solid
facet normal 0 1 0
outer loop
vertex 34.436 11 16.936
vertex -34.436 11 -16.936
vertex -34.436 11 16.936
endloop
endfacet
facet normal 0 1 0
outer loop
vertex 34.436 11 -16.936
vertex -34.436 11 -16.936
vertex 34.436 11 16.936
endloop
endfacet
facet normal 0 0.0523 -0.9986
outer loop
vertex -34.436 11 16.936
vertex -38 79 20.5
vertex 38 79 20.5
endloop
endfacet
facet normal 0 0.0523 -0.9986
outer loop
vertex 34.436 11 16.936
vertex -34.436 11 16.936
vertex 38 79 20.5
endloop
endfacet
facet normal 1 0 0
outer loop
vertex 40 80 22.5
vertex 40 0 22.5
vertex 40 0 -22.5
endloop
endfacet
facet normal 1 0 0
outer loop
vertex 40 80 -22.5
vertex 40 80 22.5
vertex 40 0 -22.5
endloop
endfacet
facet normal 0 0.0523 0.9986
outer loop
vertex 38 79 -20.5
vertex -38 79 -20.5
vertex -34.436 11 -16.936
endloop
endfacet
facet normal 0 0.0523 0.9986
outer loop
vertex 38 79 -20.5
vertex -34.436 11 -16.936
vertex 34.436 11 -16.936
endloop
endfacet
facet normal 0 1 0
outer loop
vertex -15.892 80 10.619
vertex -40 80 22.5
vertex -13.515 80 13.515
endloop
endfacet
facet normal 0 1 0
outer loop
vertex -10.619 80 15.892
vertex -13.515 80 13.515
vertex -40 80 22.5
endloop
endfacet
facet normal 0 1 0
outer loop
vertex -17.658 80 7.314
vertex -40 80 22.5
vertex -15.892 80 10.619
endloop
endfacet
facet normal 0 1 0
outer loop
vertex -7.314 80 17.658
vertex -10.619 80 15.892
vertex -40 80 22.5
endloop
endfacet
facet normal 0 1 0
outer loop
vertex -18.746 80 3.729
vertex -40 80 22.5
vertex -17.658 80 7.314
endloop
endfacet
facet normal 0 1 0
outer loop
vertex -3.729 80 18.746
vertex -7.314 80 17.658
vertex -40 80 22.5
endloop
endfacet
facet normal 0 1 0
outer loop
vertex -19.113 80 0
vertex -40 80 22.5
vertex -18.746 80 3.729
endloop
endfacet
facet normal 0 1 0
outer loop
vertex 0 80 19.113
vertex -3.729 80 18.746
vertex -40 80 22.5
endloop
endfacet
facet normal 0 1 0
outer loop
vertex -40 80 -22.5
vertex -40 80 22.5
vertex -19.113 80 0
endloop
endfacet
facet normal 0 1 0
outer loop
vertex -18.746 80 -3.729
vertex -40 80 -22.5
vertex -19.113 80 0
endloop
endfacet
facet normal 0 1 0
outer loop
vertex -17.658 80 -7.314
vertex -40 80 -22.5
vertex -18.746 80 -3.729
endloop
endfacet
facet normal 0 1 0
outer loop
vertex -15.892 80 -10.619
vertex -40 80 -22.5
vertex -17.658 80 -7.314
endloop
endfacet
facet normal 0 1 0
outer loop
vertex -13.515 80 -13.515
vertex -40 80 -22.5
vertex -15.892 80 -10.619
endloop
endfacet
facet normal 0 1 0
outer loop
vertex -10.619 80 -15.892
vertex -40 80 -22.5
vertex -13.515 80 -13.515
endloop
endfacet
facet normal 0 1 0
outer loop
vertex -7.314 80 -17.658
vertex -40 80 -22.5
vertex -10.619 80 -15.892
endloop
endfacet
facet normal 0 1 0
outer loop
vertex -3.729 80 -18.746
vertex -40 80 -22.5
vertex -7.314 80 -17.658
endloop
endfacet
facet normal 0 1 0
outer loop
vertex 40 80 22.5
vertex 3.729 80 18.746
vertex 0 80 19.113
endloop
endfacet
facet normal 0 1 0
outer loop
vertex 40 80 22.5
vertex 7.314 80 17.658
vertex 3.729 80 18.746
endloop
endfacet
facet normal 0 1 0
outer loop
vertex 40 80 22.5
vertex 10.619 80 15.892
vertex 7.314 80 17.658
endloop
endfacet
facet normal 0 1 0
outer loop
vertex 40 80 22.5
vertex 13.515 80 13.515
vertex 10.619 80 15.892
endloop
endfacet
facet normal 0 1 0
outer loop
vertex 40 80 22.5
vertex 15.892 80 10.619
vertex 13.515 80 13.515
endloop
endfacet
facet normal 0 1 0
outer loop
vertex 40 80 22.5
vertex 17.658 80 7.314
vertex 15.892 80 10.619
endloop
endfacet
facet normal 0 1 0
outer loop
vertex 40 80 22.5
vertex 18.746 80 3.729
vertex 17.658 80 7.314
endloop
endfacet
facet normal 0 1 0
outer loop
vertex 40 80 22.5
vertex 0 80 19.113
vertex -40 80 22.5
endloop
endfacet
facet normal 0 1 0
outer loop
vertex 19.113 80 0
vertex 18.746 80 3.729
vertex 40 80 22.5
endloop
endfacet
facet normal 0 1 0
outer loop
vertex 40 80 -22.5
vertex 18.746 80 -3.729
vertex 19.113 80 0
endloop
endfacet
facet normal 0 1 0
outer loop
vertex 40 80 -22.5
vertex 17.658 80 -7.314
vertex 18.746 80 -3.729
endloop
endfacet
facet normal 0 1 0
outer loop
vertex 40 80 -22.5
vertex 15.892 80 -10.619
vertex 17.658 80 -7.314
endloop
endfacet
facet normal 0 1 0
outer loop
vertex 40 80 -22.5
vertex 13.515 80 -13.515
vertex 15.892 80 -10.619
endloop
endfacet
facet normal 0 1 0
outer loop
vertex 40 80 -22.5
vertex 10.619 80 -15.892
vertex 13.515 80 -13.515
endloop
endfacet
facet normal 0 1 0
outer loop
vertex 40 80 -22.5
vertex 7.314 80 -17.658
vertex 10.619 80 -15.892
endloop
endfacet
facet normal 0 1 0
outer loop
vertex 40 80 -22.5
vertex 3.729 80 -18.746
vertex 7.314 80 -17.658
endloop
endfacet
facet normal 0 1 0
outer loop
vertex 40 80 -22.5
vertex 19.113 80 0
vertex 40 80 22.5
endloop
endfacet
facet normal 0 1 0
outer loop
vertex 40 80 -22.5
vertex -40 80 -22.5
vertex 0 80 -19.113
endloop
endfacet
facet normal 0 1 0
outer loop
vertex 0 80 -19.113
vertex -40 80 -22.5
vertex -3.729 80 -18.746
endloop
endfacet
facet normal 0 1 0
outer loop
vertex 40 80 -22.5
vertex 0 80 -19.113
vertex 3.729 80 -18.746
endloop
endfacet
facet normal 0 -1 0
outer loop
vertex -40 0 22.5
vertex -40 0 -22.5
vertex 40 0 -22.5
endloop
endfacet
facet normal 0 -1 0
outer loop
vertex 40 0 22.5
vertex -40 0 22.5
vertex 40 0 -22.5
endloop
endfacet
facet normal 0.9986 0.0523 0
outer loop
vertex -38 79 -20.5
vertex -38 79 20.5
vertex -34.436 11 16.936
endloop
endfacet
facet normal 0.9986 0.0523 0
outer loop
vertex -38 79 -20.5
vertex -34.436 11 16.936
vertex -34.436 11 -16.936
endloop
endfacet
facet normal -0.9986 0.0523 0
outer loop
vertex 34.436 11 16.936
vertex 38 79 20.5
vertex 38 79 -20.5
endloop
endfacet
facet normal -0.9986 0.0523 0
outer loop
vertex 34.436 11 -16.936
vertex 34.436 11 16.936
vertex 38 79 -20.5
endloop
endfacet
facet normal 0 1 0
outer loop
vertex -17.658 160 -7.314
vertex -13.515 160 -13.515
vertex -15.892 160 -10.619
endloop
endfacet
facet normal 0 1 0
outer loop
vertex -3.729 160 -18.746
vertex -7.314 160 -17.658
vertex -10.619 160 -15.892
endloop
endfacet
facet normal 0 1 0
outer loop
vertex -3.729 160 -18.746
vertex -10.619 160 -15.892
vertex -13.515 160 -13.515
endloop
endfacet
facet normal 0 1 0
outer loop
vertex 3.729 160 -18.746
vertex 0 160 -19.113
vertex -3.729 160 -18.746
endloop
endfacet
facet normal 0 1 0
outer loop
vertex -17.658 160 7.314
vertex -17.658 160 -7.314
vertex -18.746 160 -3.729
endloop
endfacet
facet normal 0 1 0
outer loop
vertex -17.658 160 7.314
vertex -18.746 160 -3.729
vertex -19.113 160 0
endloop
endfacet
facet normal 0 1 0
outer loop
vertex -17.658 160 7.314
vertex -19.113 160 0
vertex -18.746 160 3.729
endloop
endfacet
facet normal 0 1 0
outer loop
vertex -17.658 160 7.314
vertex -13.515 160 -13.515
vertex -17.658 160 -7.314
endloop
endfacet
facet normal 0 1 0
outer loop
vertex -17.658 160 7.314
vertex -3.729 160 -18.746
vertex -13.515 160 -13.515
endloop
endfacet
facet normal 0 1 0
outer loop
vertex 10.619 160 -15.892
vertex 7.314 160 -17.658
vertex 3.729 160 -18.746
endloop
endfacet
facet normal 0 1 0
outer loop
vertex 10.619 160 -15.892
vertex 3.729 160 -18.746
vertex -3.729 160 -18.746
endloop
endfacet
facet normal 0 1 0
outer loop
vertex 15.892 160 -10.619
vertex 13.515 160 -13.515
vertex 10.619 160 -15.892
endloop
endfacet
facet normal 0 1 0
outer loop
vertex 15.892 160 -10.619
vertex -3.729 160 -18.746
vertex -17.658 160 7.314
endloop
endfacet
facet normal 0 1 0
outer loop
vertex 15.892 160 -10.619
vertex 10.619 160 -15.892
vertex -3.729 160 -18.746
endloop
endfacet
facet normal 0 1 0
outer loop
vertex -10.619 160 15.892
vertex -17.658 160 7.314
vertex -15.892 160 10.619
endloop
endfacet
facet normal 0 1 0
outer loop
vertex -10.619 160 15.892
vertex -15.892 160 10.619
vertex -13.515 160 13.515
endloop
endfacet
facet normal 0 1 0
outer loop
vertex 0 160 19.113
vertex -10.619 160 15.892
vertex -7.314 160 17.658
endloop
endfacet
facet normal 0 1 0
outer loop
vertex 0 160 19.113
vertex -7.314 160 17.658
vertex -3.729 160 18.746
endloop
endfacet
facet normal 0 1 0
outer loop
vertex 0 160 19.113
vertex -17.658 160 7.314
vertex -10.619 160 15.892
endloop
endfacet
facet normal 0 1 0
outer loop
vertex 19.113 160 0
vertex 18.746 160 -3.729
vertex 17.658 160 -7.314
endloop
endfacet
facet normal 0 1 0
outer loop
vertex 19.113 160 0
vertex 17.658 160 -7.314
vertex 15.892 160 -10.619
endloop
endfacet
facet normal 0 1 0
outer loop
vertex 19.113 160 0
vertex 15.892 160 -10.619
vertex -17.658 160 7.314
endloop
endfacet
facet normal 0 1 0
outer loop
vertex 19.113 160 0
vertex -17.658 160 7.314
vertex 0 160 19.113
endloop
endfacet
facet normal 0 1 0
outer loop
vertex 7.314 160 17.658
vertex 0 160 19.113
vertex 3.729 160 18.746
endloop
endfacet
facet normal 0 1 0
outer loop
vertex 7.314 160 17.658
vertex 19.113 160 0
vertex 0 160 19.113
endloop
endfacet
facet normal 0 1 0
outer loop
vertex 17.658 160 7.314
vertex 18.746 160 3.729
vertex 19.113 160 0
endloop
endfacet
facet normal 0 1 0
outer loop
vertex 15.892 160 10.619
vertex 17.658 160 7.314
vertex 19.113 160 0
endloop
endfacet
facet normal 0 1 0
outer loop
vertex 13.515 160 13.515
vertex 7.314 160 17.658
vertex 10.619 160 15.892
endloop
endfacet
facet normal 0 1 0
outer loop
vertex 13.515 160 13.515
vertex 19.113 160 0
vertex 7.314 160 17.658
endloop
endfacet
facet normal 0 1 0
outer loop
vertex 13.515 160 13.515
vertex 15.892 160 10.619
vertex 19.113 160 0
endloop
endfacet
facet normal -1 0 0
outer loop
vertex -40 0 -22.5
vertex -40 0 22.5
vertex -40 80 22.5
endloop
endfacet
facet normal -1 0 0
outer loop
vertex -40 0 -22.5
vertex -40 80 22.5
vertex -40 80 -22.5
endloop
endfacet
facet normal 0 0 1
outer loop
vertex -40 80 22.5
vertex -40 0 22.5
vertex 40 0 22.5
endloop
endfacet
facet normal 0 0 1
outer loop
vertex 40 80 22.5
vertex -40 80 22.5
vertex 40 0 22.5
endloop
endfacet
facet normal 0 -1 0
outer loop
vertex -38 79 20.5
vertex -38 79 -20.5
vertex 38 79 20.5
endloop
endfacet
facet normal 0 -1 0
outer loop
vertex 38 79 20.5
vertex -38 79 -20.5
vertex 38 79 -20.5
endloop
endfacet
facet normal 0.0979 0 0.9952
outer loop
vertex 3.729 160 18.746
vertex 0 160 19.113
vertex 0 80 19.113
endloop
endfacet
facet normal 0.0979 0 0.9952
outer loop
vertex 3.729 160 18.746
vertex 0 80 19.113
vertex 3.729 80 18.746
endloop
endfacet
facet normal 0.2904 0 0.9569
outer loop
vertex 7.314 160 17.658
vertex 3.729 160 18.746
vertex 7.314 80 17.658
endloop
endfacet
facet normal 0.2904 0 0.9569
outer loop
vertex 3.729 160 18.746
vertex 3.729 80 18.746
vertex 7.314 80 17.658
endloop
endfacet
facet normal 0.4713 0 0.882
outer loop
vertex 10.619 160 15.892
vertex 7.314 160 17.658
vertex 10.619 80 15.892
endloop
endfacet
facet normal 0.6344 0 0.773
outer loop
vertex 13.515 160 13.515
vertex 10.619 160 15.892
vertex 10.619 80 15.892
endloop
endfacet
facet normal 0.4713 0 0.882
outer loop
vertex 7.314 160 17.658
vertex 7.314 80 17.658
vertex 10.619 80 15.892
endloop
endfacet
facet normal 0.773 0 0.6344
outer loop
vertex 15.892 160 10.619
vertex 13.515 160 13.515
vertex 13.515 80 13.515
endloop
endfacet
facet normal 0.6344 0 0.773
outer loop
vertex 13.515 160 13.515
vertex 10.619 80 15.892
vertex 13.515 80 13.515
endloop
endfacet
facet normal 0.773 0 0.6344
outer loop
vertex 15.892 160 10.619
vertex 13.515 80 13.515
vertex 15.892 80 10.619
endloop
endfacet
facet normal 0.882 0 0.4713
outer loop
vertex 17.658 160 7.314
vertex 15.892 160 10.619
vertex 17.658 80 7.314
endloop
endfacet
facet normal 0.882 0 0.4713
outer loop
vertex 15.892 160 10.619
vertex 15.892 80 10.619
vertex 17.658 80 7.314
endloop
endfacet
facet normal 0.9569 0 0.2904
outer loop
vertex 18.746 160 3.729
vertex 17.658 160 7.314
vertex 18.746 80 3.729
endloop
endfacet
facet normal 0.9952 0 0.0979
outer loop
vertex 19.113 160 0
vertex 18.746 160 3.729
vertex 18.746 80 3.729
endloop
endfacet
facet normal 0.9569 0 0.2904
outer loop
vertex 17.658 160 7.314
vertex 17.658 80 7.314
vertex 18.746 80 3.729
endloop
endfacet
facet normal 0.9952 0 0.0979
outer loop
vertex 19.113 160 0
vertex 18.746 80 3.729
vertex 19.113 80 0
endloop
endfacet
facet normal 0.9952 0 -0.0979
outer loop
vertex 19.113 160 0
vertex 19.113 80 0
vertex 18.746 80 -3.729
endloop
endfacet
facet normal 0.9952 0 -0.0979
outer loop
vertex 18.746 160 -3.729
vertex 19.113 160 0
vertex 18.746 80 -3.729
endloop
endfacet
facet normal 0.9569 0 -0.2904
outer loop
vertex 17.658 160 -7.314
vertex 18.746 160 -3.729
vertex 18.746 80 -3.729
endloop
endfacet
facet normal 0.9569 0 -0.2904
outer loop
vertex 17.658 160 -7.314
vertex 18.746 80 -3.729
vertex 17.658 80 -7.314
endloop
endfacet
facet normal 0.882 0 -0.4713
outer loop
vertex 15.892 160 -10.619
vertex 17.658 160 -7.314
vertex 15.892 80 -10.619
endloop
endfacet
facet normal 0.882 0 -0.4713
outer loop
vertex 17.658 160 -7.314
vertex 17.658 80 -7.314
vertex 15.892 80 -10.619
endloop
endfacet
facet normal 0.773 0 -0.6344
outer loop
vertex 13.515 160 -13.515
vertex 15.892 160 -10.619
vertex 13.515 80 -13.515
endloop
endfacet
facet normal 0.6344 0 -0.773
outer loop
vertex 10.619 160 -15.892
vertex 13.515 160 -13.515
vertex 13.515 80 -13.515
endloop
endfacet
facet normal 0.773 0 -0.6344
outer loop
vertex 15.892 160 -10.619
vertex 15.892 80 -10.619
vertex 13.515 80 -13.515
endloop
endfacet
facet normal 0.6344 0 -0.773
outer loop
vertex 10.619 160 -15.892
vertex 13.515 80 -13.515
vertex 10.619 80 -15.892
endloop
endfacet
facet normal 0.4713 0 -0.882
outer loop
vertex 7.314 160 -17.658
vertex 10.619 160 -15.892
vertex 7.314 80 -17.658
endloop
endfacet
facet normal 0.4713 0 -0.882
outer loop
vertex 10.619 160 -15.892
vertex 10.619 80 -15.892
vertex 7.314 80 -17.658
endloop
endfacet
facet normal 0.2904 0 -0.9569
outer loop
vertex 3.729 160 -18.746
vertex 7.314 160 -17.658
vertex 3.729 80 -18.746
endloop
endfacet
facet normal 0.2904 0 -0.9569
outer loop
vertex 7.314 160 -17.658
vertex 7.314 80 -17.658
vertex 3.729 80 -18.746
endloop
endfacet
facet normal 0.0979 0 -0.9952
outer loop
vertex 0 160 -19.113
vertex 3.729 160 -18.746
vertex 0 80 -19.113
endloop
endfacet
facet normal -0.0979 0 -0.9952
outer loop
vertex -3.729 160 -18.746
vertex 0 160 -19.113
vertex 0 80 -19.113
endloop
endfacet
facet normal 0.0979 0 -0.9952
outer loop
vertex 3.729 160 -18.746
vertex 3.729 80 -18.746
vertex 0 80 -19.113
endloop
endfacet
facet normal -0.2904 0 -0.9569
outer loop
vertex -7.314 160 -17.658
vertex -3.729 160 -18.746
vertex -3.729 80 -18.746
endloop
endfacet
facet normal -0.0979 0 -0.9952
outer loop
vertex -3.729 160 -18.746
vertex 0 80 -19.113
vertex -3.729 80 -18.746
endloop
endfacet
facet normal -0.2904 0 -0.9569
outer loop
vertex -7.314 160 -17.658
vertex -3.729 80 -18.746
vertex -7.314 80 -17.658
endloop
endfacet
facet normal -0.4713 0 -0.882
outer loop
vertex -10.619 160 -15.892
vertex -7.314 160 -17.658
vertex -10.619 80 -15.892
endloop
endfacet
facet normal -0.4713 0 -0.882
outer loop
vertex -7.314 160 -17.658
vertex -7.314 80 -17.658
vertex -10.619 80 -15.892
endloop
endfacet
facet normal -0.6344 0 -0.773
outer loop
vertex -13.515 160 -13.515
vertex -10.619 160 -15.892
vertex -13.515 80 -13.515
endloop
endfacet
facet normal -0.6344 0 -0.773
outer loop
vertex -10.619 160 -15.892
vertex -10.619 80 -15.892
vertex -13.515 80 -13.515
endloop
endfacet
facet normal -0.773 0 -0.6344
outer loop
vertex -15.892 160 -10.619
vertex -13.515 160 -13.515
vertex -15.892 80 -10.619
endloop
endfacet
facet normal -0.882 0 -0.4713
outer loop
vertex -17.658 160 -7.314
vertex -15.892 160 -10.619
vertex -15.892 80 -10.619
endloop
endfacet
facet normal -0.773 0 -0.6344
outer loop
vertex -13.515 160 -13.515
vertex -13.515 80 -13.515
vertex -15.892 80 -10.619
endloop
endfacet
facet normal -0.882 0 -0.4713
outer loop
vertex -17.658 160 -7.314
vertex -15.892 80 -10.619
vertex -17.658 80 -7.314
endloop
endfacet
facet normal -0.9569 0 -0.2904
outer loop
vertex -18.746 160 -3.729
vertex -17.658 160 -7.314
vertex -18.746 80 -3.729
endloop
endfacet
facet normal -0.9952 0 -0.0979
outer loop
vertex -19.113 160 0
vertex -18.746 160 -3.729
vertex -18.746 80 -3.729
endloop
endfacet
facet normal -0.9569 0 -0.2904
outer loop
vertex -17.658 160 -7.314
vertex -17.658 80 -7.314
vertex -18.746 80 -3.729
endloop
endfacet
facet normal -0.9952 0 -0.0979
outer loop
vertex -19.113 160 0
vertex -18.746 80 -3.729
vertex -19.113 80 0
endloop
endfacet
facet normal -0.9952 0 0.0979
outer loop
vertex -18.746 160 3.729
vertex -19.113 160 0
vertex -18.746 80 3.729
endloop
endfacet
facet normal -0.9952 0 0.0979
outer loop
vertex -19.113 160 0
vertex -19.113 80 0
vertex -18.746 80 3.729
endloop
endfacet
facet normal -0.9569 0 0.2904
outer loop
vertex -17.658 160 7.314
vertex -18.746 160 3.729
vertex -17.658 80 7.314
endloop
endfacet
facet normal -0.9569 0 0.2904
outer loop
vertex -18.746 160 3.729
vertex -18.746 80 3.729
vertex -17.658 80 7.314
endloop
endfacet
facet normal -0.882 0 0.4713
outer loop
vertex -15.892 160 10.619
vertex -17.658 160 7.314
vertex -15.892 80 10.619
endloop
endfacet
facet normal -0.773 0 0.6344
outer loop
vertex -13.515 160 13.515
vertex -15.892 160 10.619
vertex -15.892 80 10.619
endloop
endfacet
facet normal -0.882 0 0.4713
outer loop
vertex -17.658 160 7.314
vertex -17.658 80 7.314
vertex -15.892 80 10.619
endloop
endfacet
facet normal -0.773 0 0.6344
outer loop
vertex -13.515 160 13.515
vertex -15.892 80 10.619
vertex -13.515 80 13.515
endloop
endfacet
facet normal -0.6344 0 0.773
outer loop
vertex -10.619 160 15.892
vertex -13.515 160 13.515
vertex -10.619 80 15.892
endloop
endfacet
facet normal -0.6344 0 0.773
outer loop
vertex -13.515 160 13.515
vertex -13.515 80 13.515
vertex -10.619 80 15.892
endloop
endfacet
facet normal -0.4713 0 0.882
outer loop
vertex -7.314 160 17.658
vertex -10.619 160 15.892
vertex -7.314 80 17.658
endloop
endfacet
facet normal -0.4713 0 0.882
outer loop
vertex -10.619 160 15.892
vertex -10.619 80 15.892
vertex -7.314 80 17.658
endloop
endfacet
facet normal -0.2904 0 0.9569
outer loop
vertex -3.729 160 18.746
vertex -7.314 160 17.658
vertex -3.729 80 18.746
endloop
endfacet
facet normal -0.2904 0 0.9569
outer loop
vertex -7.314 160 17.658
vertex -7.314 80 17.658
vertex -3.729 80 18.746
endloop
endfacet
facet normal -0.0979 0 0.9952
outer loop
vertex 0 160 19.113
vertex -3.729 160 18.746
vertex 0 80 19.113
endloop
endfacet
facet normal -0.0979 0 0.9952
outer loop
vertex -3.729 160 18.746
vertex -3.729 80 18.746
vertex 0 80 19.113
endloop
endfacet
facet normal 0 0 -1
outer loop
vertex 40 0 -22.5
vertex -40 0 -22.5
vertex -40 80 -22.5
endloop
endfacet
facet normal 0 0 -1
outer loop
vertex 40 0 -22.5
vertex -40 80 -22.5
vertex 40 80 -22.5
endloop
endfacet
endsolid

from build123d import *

# Parameters (mm, degrees)
SKETCH_1_W          = 80
SKETCH_1_H          = 45
EXTRUDE_1_DEPTH     = 80
CUT_EXTRUDE_START   = -1
SKETCH_3_W          = 76
SKETCH_3_H          = 41
CUT_EXTRUDE_1_DEPTH = 68
CUT_EXTRUDE_1_DRAFT = -3
SKETCH_11_R         = 19.112902973
EXTRUDE_2_DEPTH     = 80


with BuildPart() as part:
    # 스케치1 → 보스-돌출1 (new body)
    with BuildSketch(Plane(origin=(0, 0, 0), x_dir=(1, 0, 0), z_dir=(0, 1, 0))):
        Rectangle(SKETCH_1_W, SKETCH_1_H)
    extrude(amount=EXTRUDE_1_DEPTH)


with BuildPart() as cut_extrude_1_tool:
    # 스케치3 → 컷-돌출1 (with draft: the straight prism first)
    with BuildSketch(Plane(origin=(0, 80, 0), x_dir=(1, 0, 0), z_dir=(0, 1, 0)).offset(CUT_EXTRUDE_START)):
        Rectangle(SKETCH_3_W, SKETCH_3_H)
    extrude(amount=-CUT_EXTRUDE_1_DEPTH)
    # 컷-돌출1: the draft: its side faces are tilted about the plane it starts from
    cut_extrude_1_sides = [cut_extrude_1_tool.faces().sort_by_distance(p)[0] for p in [
        (0, 45, 20.5),
        (38, 45, 0),
        (0, 45, -20.5),
        (-38, 45, 0),
    ]]
    draft(cut_extrude_1_sides, Plane(origin=(0, 80, 0), x_dir=(1, 0, 0), z_dir=(0, 1, 0)).offset(CUT_EXTRUDE_START), CUT_EXTRUDE_1_DRAFT)


with BuildPart() as part_1:
    add(part.part)

    # 컷-돌출1: cut by cut_extrude_1_tool
    add(cut_extrude_1_tool.part, mode=Mode.SUBTRACT)

    # 스케치11 → 보스-돌출2 (add)
    with BuildSketch(Plane(origin=(0, 80, 0), x_dir=(1, 0, 0), z_dir=(0, 1, 0))):
        with Locations(Location((0, 0, 0), (0, 0, 270))):
            Circle(SKETCH_11_R)
    extrude(amount=EXTRUDE_2_DEPTH)


solid = part_1.part
